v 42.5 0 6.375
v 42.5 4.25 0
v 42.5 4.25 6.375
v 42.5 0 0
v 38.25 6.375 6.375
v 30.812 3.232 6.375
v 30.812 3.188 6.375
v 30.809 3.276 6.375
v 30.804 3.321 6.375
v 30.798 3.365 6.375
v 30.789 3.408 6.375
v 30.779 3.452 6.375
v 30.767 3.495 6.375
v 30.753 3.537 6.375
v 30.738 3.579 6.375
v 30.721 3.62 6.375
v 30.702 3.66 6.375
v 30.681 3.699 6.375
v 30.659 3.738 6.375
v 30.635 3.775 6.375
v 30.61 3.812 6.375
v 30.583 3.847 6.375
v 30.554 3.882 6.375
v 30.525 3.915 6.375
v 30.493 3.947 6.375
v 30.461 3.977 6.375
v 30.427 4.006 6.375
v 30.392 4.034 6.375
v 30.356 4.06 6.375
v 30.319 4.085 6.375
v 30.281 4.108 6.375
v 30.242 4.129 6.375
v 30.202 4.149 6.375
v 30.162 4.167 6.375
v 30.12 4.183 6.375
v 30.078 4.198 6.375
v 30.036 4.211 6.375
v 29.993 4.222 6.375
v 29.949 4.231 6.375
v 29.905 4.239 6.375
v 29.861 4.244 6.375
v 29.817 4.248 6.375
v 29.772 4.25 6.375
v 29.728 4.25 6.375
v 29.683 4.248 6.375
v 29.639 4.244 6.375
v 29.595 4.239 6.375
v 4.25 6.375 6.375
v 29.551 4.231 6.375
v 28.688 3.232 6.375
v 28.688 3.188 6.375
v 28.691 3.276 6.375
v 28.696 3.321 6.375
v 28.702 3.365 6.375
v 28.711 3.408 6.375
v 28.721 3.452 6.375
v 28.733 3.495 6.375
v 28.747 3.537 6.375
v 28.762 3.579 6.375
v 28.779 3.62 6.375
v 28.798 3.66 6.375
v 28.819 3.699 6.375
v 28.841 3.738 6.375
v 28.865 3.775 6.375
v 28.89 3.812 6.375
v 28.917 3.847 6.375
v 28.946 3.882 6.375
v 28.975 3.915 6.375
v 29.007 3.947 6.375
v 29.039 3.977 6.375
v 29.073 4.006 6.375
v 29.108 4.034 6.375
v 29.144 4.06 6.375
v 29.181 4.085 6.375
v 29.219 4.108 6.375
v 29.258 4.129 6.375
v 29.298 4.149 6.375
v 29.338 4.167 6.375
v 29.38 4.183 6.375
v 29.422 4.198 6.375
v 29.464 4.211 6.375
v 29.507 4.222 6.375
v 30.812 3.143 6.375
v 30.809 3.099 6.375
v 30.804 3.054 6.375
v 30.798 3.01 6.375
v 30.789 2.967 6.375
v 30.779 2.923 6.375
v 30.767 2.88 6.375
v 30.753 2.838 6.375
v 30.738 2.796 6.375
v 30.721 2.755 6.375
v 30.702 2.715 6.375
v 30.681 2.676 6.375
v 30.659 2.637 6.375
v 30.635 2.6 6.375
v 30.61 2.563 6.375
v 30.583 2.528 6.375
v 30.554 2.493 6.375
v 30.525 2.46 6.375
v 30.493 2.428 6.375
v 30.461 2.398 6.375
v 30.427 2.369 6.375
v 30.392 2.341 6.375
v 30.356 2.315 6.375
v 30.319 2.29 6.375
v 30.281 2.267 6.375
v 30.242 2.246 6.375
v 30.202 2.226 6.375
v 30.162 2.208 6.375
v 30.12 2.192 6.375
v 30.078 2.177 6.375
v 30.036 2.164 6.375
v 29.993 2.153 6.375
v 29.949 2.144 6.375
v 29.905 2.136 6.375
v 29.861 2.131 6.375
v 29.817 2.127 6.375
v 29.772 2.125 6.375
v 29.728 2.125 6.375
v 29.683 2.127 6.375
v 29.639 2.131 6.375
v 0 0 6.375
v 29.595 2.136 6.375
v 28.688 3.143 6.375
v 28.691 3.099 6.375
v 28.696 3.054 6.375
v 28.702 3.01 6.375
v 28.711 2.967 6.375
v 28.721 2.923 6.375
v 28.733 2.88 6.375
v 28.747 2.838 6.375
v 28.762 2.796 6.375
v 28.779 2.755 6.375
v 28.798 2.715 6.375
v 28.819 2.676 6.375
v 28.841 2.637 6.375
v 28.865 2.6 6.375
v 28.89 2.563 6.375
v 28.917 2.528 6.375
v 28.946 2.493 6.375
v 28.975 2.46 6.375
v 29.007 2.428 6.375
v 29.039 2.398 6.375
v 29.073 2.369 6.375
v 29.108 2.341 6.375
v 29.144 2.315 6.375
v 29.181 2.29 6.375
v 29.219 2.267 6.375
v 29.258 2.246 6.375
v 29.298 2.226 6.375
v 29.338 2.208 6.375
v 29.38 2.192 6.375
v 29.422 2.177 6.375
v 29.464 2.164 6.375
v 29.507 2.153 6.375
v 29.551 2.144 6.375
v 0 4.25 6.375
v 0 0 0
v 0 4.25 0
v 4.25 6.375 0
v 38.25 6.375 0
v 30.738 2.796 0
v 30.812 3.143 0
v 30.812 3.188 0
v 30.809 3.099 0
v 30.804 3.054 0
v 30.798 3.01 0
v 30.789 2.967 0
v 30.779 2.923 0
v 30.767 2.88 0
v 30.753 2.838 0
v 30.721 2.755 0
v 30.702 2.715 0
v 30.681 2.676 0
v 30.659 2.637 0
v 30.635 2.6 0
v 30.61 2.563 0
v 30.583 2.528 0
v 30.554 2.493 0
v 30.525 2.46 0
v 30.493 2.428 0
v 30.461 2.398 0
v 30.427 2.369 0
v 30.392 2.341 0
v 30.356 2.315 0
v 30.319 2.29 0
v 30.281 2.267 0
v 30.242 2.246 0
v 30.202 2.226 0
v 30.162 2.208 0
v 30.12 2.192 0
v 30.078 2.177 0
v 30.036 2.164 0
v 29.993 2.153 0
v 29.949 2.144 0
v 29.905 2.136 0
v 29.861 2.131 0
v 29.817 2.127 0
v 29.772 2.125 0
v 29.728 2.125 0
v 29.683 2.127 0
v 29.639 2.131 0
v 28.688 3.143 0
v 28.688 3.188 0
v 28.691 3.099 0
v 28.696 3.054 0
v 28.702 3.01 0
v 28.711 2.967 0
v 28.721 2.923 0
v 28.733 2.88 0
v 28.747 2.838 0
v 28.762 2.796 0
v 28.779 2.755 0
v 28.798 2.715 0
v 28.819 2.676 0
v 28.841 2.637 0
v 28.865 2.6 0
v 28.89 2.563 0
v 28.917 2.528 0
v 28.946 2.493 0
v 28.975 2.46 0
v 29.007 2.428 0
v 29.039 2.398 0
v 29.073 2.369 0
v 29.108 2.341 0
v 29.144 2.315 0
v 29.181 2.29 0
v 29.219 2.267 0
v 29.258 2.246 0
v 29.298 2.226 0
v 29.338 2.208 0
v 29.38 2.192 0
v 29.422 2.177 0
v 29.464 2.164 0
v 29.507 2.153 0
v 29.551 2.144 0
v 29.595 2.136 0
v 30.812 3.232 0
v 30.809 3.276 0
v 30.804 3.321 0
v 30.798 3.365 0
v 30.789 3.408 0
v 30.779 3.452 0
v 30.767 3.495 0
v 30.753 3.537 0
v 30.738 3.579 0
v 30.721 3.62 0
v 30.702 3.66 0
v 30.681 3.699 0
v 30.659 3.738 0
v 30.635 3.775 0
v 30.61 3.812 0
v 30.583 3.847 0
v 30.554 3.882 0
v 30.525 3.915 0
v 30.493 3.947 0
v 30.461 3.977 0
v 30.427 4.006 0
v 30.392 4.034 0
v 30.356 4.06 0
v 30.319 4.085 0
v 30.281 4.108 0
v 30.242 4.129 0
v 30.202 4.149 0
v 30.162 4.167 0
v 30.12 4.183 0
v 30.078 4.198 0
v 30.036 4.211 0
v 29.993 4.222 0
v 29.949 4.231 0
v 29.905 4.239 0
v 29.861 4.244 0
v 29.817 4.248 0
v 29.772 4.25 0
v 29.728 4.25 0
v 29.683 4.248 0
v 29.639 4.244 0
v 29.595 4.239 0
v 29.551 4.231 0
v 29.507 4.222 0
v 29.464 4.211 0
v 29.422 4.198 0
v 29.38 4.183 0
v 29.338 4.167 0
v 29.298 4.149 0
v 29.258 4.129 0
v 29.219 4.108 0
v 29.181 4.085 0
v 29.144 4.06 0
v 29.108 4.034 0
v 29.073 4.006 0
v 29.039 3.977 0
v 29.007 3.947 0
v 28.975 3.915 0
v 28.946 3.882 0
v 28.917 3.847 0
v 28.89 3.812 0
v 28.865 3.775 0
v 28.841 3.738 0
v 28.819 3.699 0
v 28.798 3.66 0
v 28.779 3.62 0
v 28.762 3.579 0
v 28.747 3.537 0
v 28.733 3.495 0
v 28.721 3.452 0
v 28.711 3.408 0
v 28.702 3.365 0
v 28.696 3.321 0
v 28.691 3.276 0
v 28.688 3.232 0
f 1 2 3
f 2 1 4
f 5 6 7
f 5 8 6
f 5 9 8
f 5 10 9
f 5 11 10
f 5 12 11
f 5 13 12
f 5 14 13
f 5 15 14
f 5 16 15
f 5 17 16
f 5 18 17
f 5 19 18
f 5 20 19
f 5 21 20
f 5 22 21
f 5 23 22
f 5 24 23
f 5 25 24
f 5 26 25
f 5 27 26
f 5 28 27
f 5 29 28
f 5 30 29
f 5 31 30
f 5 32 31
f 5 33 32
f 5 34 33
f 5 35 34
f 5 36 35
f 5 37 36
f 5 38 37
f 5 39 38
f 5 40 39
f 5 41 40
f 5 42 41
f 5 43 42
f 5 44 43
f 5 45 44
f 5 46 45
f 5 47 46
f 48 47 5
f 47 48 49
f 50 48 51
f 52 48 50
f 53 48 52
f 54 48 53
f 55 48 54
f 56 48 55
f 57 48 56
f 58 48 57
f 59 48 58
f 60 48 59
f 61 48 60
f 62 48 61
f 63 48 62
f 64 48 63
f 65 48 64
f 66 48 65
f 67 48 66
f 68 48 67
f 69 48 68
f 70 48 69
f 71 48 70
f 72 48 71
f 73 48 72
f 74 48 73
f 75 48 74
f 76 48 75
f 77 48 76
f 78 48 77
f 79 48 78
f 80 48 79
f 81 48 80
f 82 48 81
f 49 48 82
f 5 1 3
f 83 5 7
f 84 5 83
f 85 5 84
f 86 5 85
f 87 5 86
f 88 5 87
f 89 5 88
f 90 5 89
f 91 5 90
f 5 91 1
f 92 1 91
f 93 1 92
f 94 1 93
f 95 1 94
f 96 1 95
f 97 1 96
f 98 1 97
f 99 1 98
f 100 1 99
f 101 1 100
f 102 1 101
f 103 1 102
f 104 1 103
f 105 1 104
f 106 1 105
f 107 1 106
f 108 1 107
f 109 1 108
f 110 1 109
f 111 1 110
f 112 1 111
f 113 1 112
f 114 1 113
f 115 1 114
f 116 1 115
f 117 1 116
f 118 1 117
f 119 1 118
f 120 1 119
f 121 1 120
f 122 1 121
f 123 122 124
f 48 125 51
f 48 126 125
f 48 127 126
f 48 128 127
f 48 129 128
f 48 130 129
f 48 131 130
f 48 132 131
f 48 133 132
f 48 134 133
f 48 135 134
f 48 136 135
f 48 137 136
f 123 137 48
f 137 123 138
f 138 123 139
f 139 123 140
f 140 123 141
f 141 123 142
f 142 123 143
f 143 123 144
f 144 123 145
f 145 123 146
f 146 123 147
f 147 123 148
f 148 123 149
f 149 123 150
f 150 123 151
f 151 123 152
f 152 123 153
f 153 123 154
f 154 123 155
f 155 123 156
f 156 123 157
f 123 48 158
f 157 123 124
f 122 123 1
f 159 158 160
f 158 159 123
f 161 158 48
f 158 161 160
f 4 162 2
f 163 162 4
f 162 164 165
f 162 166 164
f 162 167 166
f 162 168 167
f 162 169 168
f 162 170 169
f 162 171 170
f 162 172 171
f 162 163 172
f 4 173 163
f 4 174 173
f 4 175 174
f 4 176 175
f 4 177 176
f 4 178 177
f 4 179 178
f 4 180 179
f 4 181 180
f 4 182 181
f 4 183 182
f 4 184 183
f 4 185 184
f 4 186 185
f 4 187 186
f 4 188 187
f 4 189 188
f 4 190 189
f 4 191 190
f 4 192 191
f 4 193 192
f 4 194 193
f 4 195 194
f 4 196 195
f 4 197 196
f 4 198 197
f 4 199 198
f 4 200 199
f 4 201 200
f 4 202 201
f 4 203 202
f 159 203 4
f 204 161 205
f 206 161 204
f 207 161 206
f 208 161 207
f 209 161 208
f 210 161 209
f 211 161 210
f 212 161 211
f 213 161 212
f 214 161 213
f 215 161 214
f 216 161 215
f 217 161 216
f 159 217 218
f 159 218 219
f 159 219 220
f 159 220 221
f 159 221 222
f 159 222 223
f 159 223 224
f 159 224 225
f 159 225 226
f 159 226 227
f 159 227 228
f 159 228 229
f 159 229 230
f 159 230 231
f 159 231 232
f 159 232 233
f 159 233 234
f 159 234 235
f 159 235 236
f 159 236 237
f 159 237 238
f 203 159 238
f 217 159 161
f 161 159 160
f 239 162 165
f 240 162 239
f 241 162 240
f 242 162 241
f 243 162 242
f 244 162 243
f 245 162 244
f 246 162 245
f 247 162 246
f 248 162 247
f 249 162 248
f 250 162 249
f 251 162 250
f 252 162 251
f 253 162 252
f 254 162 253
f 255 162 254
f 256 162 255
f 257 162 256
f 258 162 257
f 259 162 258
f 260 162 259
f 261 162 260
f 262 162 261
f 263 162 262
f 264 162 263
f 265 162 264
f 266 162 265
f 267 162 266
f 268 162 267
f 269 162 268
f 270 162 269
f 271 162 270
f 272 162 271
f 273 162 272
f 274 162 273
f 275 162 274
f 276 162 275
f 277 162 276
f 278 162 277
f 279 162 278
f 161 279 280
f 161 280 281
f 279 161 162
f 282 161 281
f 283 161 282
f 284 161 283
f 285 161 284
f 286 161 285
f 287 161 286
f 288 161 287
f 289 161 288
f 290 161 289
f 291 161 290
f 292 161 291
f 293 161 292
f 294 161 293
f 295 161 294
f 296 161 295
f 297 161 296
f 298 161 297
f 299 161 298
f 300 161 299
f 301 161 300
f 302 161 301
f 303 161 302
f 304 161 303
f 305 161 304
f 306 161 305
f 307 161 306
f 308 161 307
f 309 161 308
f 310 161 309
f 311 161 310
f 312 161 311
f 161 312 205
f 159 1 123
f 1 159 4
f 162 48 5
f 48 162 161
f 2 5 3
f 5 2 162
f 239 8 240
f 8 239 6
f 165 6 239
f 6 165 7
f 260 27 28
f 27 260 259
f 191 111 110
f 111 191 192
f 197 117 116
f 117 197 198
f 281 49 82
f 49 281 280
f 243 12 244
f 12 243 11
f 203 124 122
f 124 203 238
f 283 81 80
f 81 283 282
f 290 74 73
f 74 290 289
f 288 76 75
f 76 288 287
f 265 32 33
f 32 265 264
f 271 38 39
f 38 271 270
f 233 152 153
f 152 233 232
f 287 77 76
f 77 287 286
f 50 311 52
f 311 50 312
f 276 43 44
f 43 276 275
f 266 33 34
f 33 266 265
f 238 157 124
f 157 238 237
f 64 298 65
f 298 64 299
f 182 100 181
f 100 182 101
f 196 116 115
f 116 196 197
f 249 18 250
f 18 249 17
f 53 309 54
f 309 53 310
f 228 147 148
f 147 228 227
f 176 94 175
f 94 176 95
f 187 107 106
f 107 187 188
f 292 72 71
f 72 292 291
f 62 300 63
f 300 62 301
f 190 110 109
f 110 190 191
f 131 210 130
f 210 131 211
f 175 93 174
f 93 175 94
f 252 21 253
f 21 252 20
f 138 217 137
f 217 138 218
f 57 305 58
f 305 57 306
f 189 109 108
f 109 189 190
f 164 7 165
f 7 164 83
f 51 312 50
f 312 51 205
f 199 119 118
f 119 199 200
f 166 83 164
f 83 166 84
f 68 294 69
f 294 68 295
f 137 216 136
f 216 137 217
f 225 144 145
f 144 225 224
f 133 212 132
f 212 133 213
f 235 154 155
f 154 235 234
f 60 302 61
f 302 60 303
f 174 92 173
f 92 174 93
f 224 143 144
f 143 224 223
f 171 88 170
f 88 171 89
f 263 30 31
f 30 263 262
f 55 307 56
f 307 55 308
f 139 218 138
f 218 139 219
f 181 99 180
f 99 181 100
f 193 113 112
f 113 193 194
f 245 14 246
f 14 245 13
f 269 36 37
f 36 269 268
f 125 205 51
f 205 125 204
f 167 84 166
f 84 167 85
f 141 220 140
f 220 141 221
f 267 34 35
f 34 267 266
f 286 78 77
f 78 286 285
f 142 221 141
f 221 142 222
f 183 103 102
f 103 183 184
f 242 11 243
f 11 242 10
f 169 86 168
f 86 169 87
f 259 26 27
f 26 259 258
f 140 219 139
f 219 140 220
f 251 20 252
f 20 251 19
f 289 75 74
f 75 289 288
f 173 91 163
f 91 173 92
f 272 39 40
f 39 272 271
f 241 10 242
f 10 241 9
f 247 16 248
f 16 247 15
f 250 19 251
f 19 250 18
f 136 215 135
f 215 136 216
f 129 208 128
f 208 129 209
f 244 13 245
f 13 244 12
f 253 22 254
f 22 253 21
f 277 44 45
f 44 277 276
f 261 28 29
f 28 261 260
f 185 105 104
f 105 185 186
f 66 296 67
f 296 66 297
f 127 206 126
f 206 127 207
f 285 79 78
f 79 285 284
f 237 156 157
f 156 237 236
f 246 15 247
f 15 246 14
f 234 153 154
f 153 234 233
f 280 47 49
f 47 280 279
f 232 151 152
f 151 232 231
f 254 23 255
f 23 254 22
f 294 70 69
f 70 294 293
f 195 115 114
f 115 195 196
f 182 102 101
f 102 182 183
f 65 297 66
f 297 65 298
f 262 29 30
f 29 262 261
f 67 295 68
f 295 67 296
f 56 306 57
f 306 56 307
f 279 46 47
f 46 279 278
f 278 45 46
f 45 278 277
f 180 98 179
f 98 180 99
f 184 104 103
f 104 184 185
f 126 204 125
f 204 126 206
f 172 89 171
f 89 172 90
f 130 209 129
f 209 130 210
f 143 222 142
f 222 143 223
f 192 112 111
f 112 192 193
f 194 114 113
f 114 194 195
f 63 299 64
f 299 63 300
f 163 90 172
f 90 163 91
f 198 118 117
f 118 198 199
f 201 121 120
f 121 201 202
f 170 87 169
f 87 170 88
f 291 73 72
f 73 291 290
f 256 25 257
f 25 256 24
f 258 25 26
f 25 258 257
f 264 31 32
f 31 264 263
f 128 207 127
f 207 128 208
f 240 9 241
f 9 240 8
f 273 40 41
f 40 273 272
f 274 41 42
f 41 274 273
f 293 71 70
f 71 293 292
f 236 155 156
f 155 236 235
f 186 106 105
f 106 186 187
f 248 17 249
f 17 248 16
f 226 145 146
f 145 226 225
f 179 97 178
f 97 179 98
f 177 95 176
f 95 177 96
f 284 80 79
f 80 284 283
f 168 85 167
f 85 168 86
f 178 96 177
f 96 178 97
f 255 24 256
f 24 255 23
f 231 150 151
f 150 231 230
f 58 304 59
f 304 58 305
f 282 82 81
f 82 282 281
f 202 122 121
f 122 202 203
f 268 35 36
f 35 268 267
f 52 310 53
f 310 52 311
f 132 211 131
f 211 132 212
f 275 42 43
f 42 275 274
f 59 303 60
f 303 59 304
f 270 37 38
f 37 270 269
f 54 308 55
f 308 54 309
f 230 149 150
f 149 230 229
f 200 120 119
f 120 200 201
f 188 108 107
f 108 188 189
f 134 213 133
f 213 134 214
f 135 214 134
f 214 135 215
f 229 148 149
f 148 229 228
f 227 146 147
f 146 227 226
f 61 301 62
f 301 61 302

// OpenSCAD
$fn = 150;

difference() {
	linear_extrude(height = 6.375) {
		polygon(points = [[0, 0], [0, 4.25], [4.25, 6.375], [38.25, 6.375], [42.5, 4.25], [42.5, 0]]);
	}
	translate(v = [29.75, 3.1875, -1]) {
		cylinder(d = 2.125, h = 8.375);
	}
}
